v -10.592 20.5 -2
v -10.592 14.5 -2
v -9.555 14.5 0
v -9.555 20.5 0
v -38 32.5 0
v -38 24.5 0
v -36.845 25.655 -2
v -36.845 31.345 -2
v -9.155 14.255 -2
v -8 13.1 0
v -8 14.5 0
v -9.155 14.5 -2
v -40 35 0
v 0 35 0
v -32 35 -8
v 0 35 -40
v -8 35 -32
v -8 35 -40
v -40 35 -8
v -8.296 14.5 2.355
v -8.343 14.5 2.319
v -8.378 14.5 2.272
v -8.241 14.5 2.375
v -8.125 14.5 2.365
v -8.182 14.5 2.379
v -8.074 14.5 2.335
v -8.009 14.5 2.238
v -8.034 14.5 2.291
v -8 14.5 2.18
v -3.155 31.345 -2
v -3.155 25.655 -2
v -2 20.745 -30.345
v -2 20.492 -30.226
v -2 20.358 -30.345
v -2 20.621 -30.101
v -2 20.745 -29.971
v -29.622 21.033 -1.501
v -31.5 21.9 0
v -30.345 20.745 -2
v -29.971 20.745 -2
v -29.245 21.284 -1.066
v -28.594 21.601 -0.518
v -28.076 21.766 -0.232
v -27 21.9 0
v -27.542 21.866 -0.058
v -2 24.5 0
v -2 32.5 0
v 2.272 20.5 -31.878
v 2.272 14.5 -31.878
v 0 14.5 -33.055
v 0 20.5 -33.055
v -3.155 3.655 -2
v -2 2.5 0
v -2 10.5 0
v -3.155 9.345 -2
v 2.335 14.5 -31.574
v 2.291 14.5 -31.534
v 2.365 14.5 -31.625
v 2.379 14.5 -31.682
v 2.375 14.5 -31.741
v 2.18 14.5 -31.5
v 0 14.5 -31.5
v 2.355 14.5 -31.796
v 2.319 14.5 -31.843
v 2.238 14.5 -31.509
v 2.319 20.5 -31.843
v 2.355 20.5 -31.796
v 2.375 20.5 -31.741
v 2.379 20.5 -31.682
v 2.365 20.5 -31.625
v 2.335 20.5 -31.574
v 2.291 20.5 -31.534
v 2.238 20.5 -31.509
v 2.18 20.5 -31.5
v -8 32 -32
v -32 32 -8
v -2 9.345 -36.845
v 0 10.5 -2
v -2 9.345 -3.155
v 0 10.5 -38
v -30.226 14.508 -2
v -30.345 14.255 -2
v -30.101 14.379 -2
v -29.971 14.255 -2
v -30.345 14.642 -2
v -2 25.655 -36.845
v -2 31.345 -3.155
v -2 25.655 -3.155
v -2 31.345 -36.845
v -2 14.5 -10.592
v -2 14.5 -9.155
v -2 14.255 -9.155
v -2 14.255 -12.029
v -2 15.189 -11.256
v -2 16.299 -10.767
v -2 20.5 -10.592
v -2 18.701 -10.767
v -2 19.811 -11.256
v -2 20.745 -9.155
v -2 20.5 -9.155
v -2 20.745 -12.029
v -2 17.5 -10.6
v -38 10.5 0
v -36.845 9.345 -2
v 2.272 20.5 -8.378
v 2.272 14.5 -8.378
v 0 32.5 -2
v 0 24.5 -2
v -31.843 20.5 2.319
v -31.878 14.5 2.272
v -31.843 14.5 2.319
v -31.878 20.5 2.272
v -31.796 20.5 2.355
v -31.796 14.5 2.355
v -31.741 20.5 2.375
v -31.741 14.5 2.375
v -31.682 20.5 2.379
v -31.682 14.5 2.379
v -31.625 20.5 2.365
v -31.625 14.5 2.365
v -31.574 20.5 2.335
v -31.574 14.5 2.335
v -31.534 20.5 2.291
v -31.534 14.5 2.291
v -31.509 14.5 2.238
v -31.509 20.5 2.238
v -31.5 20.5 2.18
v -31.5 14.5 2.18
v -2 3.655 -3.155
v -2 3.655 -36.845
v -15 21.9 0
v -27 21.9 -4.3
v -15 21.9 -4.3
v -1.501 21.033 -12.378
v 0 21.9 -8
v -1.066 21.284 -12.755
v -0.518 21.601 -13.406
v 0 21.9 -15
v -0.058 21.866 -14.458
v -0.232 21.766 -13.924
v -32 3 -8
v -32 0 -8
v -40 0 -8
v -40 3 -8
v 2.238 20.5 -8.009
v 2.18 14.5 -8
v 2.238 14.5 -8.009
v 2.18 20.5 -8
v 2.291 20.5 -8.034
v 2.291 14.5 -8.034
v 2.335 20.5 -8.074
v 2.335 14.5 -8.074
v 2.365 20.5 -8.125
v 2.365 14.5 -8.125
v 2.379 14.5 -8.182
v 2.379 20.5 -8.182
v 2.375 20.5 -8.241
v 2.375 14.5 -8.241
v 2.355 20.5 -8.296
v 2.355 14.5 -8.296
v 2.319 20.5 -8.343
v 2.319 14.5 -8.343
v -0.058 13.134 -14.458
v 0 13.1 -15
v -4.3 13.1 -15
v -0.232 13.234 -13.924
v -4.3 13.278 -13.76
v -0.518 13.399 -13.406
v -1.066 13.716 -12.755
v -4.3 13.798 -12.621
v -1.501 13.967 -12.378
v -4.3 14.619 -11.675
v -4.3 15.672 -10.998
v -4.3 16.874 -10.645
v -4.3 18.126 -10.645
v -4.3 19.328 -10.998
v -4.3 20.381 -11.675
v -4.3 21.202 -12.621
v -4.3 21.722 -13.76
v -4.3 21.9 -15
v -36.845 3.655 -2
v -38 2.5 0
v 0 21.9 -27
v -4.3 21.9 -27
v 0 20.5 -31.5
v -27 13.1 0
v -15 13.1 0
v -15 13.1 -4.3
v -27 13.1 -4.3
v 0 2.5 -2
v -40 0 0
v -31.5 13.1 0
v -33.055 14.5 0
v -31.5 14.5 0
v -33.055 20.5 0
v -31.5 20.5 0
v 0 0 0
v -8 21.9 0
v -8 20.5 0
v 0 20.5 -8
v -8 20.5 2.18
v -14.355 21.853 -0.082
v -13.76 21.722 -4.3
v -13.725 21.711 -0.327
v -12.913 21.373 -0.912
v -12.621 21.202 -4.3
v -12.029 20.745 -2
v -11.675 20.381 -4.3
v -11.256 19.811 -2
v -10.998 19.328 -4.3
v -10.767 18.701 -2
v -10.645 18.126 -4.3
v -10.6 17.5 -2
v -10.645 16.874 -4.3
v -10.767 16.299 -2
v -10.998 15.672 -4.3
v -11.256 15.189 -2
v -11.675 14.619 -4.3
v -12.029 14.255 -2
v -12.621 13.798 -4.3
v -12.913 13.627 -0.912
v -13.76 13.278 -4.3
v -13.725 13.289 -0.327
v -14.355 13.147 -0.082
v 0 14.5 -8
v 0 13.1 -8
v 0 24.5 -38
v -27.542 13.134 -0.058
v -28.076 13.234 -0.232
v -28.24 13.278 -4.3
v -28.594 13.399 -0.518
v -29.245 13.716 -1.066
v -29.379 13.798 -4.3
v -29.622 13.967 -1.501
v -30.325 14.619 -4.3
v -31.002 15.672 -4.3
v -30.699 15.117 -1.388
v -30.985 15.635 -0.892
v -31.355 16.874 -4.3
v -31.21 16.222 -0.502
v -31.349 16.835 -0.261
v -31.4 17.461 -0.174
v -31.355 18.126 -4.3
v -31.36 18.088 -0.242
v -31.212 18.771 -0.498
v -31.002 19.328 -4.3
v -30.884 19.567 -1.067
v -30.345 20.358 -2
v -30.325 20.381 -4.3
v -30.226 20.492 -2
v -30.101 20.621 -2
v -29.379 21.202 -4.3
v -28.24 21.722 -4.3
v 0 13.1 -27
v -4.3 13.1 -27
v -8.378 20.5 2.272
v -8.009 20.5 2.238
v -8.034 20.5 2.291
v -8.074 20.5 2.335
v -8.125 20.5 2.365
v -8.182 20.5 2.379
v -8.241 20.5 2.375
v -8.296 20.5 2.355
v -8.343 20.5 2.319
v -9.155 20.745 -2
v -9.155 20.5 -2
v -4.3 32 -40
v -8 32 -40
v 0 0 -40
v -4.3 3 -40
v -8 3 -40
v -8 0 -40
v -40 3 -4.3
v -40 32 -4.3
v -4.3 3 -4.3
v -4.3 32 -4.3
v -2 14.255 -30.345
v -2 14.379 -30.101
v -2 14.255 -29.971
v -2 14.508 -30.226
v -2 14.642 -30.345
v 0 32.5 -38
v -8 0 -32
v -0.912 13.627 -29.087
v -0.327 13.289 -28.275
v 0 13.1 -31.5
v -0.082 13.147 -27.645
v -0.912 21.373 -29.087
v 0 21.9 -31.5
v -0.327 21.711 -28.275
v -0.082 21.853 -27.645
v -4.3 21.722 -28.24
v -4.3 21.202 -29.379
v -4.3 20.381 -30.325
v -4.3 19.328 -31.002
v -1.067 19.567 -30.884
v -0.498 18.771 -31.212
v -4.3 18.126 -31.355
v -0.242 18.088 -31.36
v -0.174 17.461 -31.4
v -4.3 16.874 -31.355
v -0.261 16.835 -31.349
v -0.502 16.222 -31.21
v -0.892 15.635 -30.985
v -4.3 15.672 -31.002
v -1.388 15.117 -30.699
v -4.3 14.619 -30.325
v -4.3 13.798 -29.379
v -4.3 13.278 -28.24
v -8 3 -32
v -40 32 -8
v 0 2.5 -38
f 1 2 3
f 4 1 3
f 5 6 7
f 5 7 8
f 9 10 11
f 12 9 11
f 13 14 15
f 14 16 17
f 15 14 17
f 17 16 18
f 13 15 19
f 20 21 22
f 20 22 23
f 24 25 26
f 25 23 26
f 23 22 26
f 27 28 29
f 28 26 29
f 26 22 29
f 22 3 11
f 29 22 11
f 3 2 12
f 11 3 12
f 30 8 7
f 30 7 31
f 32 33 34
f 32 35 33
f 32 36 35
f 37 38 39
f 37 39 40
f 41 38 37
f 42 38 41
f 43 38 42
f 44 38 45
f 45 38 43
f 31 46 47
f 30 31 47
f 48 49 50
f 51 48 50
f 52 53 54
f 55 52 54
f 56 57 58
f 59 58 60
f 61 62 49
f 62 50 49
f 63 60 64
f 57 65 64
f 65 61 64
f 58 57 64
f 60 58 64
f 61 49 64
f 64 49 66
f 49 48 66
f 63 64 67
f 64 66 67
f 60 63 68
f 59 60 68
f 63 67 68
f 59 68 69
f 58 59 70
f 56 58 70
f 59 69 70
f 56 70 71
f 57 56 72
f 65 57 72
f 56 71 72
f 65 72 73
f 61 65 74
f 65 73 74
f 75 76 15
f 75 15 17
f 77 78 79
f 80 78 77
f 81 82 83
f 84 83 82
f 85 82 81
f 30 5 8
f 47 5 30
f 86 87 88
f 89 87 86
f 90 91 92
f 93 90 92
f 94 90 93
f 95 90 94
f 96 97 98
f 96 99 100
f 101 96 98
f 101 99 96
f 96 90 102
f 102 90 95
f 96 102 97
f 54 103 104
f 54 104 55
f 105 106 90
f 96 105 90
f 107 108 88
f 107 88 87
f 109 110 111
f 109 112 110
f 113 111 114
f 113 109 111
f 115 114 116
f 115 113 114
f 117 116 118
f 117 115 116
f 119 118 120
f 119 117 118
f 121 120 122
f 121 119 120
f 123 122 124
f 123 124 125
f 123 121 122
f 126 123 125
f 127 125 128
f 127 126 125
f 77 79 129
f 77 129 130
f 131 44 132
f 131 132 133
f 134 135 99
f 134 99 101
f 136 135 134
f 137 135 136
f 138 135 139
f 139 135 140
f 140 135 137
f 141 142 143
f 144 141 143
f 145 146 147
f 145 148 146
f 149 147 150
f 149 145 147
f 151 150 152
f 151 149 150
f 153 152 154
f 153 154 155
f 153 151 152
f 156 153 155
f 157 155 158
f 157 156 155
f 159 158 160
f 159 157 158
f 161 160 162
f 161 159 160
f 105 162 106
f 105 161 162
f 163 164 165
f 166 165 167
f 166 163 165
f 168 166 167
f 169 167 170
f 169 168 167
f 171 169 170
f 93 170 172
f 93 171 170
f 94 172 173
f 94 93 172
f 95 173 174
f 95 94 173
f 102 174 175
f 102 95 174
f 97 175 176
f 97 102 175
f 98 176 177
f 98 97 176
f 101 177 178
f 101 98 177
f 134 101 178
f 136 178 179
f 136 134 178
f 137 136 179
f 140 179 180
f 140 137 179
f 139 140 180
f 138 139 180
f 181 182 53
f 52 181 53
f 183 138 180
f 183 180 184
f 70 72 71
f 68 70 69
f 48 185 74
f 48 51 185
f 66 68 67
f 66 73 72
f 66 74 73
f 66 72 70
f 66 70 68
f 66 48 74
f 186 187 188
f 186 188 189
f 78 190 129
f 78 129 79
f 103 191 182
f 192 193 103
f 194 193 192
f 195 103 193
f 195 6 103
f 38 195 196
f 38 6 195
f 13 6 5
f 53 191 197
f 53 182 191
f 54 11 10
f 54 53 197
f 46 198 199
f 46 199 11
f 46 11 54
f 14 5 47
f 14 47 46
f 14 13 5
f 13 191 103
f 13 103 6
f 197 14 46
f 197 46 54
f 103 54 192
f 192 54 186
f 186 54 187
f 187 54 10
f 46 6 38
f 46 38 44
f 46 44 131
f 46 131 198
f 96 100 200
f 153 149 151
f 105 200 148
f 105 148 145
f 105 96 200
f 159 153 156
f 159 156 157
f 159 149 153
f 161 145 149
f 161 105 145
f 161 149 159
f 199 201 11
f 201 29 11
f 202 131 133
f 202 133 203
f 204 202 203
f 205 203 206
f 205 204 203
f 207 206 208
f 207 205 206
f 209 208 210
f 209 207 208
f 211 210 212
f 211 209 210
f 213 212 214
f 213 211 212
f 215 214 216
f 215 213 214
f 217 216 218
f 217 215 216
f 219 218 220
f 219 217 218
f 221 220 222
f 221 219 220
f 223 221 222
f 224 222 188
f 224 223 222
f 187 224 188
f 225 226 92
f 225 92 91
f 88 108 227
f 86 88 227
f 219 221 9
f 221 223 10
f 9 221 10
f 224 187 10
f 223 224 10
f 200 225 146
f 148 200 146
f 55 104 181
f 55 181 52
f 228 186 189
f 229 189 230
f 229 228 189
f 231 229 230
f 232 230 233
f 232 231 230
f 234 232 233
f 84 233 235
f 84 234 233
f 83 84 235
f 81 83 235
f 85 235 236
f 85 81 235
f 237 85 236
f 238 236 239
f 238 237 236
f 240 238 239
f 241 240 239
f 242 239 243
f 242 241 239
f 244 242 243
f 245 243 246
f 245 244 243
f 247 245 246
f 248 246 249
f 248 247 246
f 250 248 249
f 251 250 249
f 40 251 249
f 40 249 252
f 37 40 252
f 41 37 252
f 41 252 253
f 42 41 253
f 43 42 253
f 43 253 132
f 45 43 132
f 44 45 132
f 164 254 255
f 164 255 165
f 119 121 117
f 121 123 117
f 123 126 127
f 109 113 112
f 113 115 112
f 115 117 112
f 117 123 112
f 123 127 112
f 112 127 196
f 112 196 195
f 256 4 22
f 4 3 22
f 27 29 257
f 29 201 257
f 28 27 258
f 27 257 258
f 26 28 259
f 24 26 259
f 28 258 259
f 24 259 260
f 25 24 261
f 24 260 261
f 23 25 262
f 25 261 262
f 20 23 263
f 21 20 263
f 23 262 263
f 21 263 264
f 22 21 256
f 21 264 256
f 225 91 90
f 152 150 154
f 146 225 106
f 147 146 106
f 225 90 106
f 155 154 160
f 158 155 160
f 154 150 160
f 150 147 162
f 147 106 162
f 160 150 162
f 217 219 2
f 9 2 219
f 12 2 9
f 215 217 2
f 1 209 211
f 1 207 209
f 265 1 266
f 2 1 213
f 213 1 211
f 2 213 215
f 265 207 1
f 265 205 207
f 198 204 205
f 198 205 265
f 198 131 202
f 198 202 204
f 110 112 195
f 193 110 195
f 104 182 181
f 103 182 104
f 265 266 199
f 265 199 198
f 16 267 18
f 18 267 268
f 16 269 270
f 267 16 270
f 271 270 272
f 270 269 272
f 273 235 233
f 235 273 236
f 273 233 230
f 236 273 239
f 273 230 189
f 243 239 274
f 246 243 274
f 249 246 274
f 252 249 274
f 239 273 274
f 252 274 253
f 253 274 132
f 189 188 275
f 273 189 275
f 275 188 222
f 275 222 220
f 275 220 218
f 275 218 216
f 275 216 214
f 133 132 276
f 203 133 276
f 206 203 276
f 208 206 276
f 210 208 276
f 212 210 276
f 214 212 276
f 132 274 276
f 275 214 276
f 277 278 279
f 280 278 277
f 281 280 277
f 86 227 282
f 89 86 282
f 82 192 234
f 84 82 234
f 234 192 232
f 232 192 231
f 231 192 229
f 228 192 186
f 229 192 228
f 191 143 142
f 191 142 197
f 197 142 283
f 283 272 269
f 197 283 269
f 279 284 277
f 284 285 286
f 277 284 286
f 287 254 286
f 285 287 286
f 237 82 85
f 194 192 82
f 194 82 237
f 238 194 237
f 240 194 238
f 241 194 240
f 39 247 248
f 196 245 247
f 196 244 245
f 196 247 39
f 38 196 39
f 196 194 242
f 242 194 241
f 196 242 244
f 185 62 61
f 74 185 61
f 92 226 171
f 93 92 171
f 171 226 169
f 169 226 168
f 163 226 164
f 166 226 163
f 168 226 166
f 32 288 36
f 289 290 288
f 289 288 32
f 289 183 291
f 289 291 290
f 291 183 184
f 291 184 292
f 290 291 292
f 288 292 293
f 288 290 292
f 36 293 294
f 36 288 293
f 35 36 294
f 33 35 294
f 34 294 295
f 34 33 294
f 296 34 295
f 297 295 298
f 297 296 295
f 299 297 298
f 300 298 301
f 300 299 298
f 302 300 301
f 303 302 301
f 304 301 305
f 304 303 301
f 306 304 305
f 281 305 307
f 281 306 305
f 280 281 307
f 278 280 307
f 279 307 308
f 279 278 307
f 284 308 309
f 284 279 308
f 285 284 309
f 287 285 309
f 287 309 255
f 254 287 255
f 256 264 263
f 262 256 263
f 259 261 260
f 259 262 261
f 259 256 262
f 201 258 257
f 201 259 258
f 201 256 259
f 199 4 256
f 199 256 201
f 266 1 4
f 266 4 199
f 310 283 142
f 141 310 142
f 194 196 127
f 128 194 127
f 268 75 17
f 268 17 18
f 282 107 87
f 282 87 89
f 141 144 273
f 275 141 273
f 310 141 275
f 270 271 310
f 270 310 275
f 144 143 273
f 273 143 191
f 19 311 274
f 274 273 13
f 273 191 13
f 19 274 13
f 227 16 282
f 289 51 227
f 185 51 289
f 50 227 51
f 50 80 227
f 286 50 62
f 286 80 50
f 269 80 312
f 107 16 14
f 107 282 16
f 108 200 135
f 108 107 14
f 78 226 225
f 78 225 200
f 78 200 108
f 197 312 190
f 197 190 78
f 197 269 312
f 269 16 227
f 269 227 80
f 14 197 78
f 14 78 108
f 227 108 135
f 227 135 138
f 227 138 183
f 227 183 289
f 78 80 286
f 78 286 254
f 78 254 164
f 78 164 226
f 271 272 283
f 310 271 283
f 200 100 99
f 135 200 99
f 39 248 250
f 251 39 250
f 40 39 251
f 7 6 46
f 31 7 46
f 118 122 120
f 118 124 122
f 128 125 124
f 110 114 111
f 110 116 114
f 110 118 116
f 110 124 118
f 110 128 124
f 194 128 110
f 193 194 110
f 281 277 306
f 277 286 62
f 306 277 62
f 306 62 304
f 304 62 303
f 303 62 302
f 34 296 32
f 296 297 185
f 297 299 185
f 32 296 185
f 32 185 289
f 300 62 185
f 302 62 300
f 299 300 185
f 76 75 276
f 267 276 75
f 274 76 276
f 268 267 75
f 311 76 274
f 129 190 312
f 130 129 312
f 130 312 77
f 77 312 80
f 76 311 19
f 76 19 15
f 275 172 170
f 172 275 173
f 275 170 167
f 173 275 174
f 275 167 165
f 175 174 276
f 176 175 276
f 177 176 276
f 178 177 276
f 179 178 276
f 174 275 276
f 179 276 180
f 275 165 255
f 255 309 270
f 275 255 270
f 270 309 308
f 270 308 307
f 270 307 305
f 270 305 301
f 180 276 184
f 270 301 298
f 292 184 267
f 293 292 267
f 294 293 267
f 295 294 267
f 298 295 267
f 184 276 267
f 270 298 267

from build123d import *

# Parameters (mm, degrees)
EXTRUDE_1_DEPTH               = 3
SKETCH_2_W                    = 40
SKETCH_2_H                    = 29
EXTRUDE_2_DEPTH               = 4.3
EXTRUDE_3_DEPTH               = 3
SKETCH_4_W                    = 35.7
SKETCH_4_H                    = 29
EXTRUDE_4_DEPTH               = 4.3
SKETCH_5_W                    = 36
SKETCH_5_H                    = 8
CUT_EXTRUDE_1_DEPTH           = 2
CUT_EXTRUDE_1_DRAFT           = -30
CUT_EXTRUDE_1_PROFILE_2_DEPTH = 2
CUT_EXTRUDE_1_PROFILE_2_DRAFT = -30
SKETCH_5_W_2                  = 23.5
SKETCH_5_H_2                  = 8.8
CUT_EXTRUDE_1_PROFILE_3_DEPTH = 2
CUT_EXTRUDE_1_PROFILE_3_DRAFT = -30
SKETCH_6_W                    = 36
SKETCH_6_H                    = 8
CUT_EXTRUDE_2_DEPTH           = 2
CUT_EXTRUDE_2_DRAFT           = -30
CUT_EXTRUDE_2_PROFILE_2_DEPTH = 2
CUT_EXTRUDE_2_PROFILE_2_DRAFT = -30
SKETCH_6_W_2                  = 23.5
SKETCH_6_H_2                  = 8.8
CUT_EXTRUDE_2_PROFILE_3_DEPTH = 2
CUT_EXTRUDE_2_PROFILE_3_DRAFT = -30
EXTRUDE_5_DEPTH               = 3
EXTRUDE_6_DEPTH               = 3
FILLET_2_R                    = 0.2


with BuildPart() as part:
    # 草图1 → 凸台-拉伸1 (new body)
    with BuildSketch(Plane(origin=(0, 0, 0), x_dir=(1, 0, 0), z_dir=(0, 1, 0))):
        Polygon((0, 0), (0, 40), (-8, 40), (-8, 32), (-32, 8), (-40, 8), (-40, 0), align=None)
    extrude(amount=EXTRUDE_1_DEPTH)

    # 草图2 → 凸台-拉伸2 (add)
    with BuildSketch(Plane(origin=(0, 0, 0), x_dir=(0, 0, -1), z_dir=(1, 0, 0))):
        with Locations((20, 17.5)):
            Rectangle(SKETCH_2_W, SKETCH_2_H)
        with BuildLine():
            Line((27, 13.1), (15, 13.1))
            ThreePointArc((15, 13.1), (10.6, 17.5), (15, 21.9))
            Line((15, 21.9), (27, 21.9))
            ThreePointArc((27, 21.9), (31.4, 17.5), (27, 13.1))
        make_face(mode=Mode.SUBTRACT)
    extrude(amount=-EXTRUDE_2_DEPTH)

    # 草图3 → 凸台-拉伸3 (add)
    with BuildSketch(Plane(origin=(0, 32, 0), x_dir=(1, 0, 0), z_dir=(0, 1, 0))):
        Polygon((-4.3, 40), (0, 40), (0, 0), (-4.3, 0), (-40, 0), (-40, 8), (-32, 8), (-8, 32), (-8, 40), align=None)
    extrude(amount=EXTRUDE_3_DEPTH)

    # 草图4 → 凸台-拉伸4 (add)
    with BuildSketch(Plane.XY):
        with Locations((-22.15, 17.5)):
            Rectangle(SKETCH_4_W, SKETCH_4_H)
        with BuildLine():
            Line((-27, 21.9), (-15, 21.9))
            ThreePointArc((-15, 21.9), (-10.6, 17.5), (-15, 13.1))
            Line((-15, 13.1), (-27, 13.1))
            ThreePointArc((-27, 13.1), (-31.4, 17.5), (-27, 21.9))
        make_face(mode=Mode.SUBTRACT)
    extrude(amount=-EXTRUDE_4_DEPTH)


with BuildPart() as cut_extrude_1_tool:
    # 草图5 → 切除-拉伸1 (with draft: the straight prism first)
    with BuildSketch(Plane(origin=(0, 0, 0), x_dir=(0, 0, -1), z_dir=(1, 0, 0))):
        with Locations((20, 28.5)):
            Rectangle(SKETCH_5_W, SKETCH_5_H)
    extrude(amount=-CUT_EXTRUDE_1_DEPTH)
    # 切除-拉伸1: the draft: its side faces are tilted about the plane it starts from
    cut_extrude_1_sides = [cut_extrude_1_tool.faces().sort_by_distance(p)[0] for p in [
        (-1, 32.5, -20),
        (-1, 28.5, -2),
        (-1, 24.5, -20),
        (-1, 28.5, -38),
    ]]
    draft(cut_extrude_1_sides, Plane(origin=(0, 0, 0), x_dir=(0, 0, -1), z_dir=(1, 0, 0)), CUT_EXTRUDE_1_DRAFT)


with BuildPart() as part_1:
    add(part.part)

    # 切除-拉伸1: cut by cut_extrude_1_tool
    add(cut_extrude_1_tool.part, mode=Mode.SUBTRACT)


with BuildPart() as cut_extrude_1_profile_2_tool:
    # 草图5 → 切除-拉伸1 profile 2 (with draft: the straight prism first)
    with BuildSketch(Plane(origin=(0, 0, 0), x_dir=(0, 0, -1), z_dir=(1, 0, 0))):
        with Locations((20, 6.5)):
            Rectangle(SKETCH_5_W, SKETCH_5_H)
    extrude(amount=-CUT_EXTRUDE_1_PROFILE_2_DEPTH)
    # 切除-拉伸1 profile 2: the draft: its side faces are tilted about the plane it starts from
    cut_extrude_1_profile_2_sides = [cut_extrude_1_profile_2_tool.faces().sort_by_distance(p)[0] for p in [
        (-1, 10.5, -20),
        (-1, 6.5, -2),
        (-1, 2.5, -20),
        (-1, 6.5, -38),
    ]]
    draft(cut_extrude_1_profile_2_sides, Plane(origin=(0, 0, 0), x_dir=(0, 0, -1), z_dir=(1, 0, 0)), CUT_EXTRUDE_1_PROFILE_2_DRAFT)


with BuildPart() as part_2:
    add(part_1.part)

    # 切除-拉伸1 profile 2: cut by cut_extrude_1_profile_2_tool
    add(cut_extrude_1_profile_2_tool.part, mode=Mode.SUBTRACT)


with BuildPart() as cut_extrude_1_profile_3_tool:
    # 草图5 → 切除-拉伸1 profile 3 (with draft: the straight prism first)
    with BuildSketch(Plane(origin=(0, 0, 0), x_dir=(0, 0, -1), z_dir=(1, 0, 0))):
        with Locations((19.75, 17.5)):
            Rectangle(SKETCH_5_W_2, SKETCH_5_H_2)
    extrude(amount=-CUT_EXTRUDE_1_PROFILE_3_DEPTH)
    # 切除-拉伸1 profile 3: the draft: its side faces are tilted about the plane it starts from
    cut_extrude_1_profile_3_sides = [cut_extrude_1_profile_3_tool.faces().sort_by_distance(p)[0] for p in [
        (-1, 21.9, -19.75),
        (-1, 17.5, -8),
        (-1, 13.1, -19.75),
        (-1, 17.5, -31.5),
    ]]
    draft(cut_extrude_1_profile_3_sides, Plane(origin=(0, 0, 0), x_dir=(0, 0, -1), z_dir=(1, 0, 0)), CUT_EXTRUDE_1_PROFILE_3_DRAFT)


with BuildPart() as part_3:
    add(part_2.part)

    # 切除-拉伸1 profile 3: cut by cut_extrude_1_profile_3_tool
    add(cut_extrude_1_profile_3_tool.part, mode=Mode.SUBTRACT)


with BuildPart() as cut_extrude_2_tool:
    # 草图6 → 切除-拉伸2 (with draft: the straight prism first)
    with BuildSketch(Plane.XY):
        with Locations((-20, 6.5)):
            Rectangle(SKETCH_6_W, SKETCH_6_H)
    extrude(amount=-CUT_EXTRUDE_2_DEPTH)
    # 切除-拉伸2: the draft: its side faces are tilted about the plane it starts from
    cut_extrude_2_sides = [cut_extrude_2_tool.faces().sort_by_distance(p)[0] for p in [
        (-20, 2.5, -1),
        (-2, 6.5, -1),
        (-20, 10.5, -1),
        (-38, 6.5, -1),
    ]]
    draft(cut_extrude_2_sides, Plane.XY, CUT_EXTRUDE_2_DRAFT)


with BuildPart() as part_4:
    add(part_3.part)

    # 切除-拉伸2: cut by cut_extrude_2_tool
    add(cut_extrude_2_tool.part, mode=Mode.SUBTRACT)


with BuildPart() as cut_extrude_2_profile_2_tool:
    # 草图6 → 切除-拉伸2 profile 2 (with draft: the straight prism first)
    with BuildSketch(Plane.XY):
        with Locations((-20, 28.5)):
            Rectangle(SKETCH_6_W, SKETCH_6_H)
    extrude(amount=-CUT_EXTRUDE_2_PROFILE_2_DEPTH)
    # 切除-拉伸2 profile 2: the draft: its side faces are tilted about the plane it starts from
    cut_extrude_2_profile_2_sides = [cut_extrude_2_profile_2_tool.faces().sort_by_distance(p)[0] for p in [
        (-20, 24.5, -1),
        (-2, 28.5, -1),
        (-20, 32.5, -1),
        (-38, 28.5, -1),
    ]]
    draft(cut_extrude_2_profile_2_sides, Plane.XY, CUT_EXTRUDE_2_PROFILE_2_DRAFT)


with BuildPart() as part_5:
    add(part_4.part)

    # 切除-拉伸2 profile 2: cut by cut_extrude_2_profile_2_tool
    add(cut_extrude_2_profile_2_tool.part, mode=Mode.SUBTRACT)


with BuildPart() as cut_extrude_2_profile_3_tool:
    # 草图6 → 切除-拉伸2 profile 3 (with draft: the straight prism first)
    with BuildSketch(Plane.XY):
        with Locations((-19.75, 17.5)):
            Rectangle(SKETCH_6_W_2, SKETCH_6_H_2)
    extrude(amount=-CUT_EXTRUDE_2_PROFILE_3_DEPTH)
    # 切除-拉伸2 profile 3: the draft: its side faces are tilted about the plane it starts from
    cut_extrude_2_profile_3_sides = [cut_extrude_2_profile_3_tool.faces().sort_by_distance(p)[0] for p in [
        (-19.75, 13.1, -1),
        (-8, 17.5, -1),
        (-19.75, 21.9, -1),
        (-31.5, 17.5, -1),
    ]]
    draft(cut_extrude_2_profile_3_sides, Plane.XY, CUT_EXTRUDE_2_PROFILE_3_DRAFT)


with BuildPart() as part_6:
    add(part_5.part)

    # 切除-拉伸2 profile 3: cut by cut_extrude_2_profile_3_tool
    add(cut_extrude_2_profile_3_tool.part, mode=Mode.SUBTRACT)

    # 草图7 → 凸台-拉伸5 (add, symmetric)
    with BuildSketch(Plane(origin=(0, 17.5, 0), x_dir=(1, 0, 0), z_dir=(0, 1, 0))):
        Polygon((-2, 8), (3, 8), (-2, 10.591750104), align=None)
        Polygon((-2, 34.091750104), (-2, 31.5), (3, 31.5), align=None)
    extrude(amount=EXTRUDE_5_DEPTH, both=True)

    # 草图8 → 凸台-拉伸6 (add, symmetric)
    with BuildSketch(Plane(origin=(0, 17.5, 0), x_dir=(1, 0, 0), z_dir=(0, 1, 0))):
        Polygon((-8, -3), (-8, 0), (-9.154700538, 2), (-10.591750104, 2), align=None)
        Polygon((-31.5, -3), (-31.5, 2), (-34.091750104, 2), align=None)
    extrude(amount=EXTRUDE_6_DEPTH, both=True)

    # 圆角2
    fillet_2_edges = [part_6.edges().sort_by_distance(p)[0] for p in [
        (3, 17.5, -31.5),
        (3, 17.5, -8),
        (-31.5, 17.5, 3),
        (-8, 17.5, 3),
    ]]
    fillet(fillet_2_edges, radius=FILLET_2_R)


solid = part_6.part
